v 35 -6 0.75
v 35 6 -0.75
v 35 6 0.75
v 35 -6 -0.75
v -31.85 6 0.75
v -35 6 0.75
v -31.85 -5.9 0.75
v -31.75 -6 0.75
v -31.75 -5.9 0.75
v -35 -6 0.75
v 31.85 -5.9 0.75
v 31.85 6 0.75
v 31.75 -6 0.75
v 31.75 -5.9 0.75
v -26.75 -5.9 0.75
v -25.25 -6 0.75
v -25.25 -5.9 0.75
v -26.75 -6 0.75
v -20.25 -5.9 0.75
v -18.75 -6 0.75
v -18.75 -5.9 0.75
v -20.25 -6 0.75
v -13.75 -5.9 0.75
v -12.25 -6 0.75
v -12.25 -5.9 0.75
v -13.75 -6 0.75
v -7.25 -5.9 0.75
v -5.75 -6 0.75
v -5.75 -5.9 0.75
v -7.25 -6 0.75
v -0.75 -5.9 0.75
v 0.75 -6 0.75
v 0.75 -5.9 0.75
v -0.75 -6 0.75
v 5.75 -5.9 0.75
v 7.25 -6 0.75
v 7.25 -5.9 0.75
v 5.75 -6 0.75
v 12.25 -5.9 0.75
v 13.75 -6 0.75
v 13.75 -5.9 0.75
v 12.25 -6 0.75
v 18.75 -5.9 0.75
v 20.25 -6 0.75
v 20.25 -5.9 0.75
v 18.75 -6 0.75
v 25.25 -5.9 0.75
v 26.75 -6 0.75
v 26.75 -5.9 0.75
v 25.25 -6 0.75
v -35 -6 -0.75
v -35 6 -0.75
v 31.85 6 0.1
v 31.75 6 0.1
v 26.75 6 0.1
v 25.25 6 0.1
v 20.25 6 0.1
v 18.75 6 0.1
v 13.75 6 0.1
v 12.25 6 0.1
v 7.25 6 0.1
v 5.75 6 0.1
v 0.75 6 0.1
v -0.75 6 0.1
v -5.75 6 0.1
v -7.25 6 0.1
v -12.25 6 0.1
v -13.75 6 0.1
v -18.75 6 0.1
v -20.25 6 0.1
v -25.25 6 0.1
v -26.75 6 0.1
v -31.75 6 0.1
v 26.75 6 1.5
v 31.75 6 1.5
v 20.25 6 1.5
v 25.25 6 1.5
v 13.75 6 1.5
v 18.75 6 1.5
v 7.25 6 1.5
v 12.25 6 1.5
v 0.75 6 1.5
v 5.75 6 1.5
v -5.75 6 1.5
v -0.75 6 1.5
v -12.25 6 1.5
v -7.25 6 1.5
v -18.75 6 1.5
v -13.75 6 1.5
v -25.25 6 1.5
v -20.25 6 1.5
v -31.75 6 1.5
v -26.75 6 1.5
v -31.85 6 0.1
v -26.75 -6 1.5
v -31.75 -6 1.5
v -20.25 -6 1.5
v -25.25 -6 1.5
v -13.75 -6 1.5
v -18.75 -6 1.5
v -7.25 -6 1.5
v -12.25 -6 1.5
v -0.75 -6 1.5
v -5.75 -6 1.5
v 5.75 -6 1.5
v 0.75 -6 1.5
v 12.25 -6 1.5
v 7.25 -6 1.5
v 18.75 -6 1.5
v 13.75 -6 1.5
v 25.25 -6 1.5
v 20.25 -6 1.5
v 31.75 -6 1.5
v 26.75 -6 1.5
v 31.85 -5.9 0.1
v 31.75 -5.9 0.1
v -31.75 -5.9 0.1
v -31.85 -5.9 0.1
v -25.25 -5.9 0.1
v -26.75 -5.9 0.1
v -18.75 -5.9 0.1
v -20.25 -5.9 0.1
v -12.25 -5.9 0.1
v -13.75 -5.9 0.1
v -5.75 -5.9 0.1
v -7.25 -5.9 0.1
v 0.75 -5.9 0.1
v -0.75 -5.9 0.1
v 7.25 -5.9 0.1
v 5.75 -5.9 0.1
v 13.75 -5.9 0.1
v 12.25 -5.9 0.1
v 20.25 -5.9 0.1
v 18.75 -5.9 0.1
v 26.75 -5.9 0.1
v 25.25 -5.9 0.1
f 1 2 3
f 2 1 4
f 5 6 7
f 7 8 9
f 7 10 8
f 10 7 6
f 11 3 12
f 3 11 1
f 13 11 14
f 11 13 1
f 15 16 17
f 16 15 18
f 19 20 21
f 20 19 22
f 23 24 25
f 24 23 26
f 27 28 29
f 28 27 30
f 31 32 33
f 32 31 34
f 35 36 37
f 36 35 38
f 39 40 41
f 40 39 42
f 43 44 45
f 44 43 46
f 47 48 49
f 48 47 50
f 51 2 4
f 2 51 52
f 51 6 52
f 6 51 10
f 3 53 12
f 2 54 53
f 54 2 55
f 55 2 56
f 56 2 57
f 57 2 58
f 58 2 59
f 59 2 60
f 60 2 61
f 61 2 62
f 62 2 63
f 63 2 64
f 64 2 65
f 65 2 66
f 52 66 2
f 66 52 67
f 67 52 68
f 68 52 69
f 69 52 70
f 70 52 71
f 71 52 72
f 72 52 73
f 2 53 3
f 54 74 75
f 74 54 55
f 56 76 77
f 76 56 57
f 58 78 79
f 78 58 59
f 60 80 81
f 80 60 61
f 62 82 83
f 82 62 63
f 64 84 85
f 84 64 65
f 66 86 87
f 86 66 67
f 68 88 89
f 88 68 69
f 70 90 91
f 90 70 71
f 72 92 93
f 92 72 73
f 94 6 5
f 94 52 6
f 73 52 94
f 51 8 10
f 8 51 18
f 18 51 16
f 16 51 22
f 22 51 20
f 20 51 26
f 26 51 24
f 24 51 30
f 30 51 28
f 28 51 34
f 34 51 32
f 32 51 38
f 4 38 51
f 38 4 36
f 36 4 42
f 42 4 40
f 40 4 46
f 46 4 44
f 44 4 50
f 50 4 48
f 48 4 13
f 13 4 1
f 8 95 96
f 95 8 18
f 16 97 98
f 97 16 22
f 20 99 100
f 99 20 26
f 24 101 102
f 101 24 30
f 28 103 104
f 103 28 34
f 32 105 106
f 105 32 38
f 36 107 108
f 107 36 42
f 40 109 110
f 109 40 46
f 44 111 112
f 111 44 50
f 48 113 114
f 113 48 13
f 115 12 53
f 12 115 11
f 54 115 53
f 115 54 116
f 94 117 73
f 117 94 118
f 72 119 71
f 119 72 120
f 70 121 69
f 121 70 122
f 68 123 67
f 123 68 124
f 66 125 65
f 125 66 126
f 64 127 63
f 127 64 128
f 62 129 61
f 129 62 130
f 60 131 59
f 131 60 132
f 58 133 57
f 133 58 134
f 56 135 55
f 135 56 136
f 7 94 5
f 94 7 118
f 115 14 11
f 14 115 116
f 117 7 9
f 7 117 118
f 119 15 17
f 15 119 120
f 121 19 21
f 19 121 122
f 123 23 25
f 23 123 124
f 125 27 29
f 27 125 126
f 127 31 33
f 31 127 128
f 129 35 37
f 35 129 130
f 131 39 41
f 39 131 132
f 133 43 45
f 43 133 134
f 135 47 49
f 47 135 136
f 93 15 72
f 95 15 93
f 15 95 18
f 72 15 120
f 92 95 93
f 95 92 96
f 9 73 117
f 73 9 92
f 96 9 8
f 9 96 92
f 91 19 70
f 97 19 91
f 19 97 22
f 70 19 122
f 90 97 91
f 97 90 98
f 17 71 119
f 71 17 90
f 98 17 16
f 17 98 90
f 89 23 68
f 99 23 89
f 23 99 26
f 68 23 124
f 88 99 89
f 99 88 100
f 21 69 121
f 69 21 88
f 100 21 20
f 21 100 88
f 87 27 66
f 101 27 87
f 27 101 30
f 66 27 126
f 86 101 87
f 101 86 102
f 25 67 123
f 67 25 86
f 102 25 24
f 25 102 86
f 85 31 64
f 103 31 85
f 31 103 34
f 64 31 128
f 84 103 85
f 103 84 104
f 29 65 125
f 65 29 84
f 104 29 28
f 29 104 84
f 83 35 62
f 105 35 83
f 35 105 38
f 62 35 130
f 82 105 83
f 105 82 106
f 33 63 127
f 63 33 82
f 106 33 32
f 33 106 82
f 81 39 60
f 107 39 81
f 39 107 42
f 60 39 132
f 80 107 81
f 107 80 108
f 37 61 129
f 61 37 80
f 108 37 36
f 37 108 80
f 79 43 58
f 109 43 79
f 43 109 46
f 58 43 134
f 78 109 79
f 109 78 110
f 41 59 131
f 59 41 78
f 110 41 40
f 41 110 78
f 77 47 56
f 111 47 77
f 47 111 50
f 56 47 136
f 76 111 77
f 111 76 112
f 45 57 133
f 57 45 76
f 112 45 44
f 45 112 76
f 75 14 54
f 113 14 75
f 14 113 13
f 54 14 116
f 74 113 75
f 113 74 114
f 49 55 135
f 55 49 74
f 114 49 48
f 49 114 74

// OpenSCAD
// 10-well Agarose Gel Comb
// Designed for FDM printing, lying flat on the XY plane (Z=0).
// Dimensions in millimetres.

// --- Dimensions ---
// Spine (Back Bar)
$spine_length = 70;   // X dimension
$spine_width = 12;    // Y dimension
$plate_thickness = 1.5; // Z dimension

// Teeth
$num_teeth = 10;
$tooth_width = 5.0;   // X dimension
$tooth_length = 12;   // Y dimension (extends from spine edge)
$gap_size = 1.5;      // Gap between teeth

// --- Calculations ---
// Total width of the teeth row
$total_teeth_width = $num_teeth * $tooth_width;
// Total width of the gaps
$total_gap_width = ($num_teeth - 1) * $gap_size;
// Total width of the tooth row including gaps
$tooth_row_width = $total_teeth_width + $total_gap_width;

// Centering offset in X: The row must be centered on the spine.
// Spine spans [-35, 35]. Row must span [-RowWidth/2, +RowWidth/2].
$tooth_row_start_x = -($tooth_row_width / 2);

// Position of the spine edge from which teeth hang (-Y direction)
// Spine is 12mm wide. Teeth hang from the bottom edge (Y = -6).
$spine_bottom_y = -$spine_width / 2;
$tooth_start_y = $spine_bottom_y;
$tooth_end_y = $tooth_start_y - $tooth_length;

// --- Main Body (Spine) ---
// The spine is a flat plate 70x12x1.5
// We use a difference to cut the teeth out from the top surface only.
// The cut volume must extend slightly past the tooth length to ensure separation.
difference() {
    // Main block
    cube([
        $spine_length, 
        $spine_width, 
        $plate_thickness
    ], center = true);
    
    // Cut out the area where teeth will be attached to create a clean separation.
    // We cut a rectangle slightly larger than the tooth row to ensure separation.
    // The cut extends 0.1mm past the tooth length in -Y to ensure the teeth are not fused.
    translate([
        $tooth_row_start_x - 0.1, // Left edge of tooth row - clearance
        $spine_bottom_y + 0.1,    // Top edge of spine + clearance
        0.1                       // Just below surface
    ])
    cube([
        $tooth_row_width + 0.2,
        $tooth_length + 0.2,
        $plate_thickness + 0.2
    ]);
}

// --- Teeth ---
// Loop to generate 10 teeth
for (i = [0 : $num_teeth - 1]) {
    // Calculate X position for this tooth
    // Start at $tooth_row_start_x, add tooth_width and gap_size for each previous tooth
    $current_x = $tooth_row_start_x + ($tooth_width + $gap_size) * i;
    
    // Translate to position
    translate([
        $current_x, 
        $tooth_start_y, 
        0
    ])
    // Tooth is a rectangular prism: width x length x thickness
    // Width is X, Length is -Y, Thickness is Z
    cube([
        $tooth_width,
        $tooth_length,
        $plate_thickness
    ]);
}
